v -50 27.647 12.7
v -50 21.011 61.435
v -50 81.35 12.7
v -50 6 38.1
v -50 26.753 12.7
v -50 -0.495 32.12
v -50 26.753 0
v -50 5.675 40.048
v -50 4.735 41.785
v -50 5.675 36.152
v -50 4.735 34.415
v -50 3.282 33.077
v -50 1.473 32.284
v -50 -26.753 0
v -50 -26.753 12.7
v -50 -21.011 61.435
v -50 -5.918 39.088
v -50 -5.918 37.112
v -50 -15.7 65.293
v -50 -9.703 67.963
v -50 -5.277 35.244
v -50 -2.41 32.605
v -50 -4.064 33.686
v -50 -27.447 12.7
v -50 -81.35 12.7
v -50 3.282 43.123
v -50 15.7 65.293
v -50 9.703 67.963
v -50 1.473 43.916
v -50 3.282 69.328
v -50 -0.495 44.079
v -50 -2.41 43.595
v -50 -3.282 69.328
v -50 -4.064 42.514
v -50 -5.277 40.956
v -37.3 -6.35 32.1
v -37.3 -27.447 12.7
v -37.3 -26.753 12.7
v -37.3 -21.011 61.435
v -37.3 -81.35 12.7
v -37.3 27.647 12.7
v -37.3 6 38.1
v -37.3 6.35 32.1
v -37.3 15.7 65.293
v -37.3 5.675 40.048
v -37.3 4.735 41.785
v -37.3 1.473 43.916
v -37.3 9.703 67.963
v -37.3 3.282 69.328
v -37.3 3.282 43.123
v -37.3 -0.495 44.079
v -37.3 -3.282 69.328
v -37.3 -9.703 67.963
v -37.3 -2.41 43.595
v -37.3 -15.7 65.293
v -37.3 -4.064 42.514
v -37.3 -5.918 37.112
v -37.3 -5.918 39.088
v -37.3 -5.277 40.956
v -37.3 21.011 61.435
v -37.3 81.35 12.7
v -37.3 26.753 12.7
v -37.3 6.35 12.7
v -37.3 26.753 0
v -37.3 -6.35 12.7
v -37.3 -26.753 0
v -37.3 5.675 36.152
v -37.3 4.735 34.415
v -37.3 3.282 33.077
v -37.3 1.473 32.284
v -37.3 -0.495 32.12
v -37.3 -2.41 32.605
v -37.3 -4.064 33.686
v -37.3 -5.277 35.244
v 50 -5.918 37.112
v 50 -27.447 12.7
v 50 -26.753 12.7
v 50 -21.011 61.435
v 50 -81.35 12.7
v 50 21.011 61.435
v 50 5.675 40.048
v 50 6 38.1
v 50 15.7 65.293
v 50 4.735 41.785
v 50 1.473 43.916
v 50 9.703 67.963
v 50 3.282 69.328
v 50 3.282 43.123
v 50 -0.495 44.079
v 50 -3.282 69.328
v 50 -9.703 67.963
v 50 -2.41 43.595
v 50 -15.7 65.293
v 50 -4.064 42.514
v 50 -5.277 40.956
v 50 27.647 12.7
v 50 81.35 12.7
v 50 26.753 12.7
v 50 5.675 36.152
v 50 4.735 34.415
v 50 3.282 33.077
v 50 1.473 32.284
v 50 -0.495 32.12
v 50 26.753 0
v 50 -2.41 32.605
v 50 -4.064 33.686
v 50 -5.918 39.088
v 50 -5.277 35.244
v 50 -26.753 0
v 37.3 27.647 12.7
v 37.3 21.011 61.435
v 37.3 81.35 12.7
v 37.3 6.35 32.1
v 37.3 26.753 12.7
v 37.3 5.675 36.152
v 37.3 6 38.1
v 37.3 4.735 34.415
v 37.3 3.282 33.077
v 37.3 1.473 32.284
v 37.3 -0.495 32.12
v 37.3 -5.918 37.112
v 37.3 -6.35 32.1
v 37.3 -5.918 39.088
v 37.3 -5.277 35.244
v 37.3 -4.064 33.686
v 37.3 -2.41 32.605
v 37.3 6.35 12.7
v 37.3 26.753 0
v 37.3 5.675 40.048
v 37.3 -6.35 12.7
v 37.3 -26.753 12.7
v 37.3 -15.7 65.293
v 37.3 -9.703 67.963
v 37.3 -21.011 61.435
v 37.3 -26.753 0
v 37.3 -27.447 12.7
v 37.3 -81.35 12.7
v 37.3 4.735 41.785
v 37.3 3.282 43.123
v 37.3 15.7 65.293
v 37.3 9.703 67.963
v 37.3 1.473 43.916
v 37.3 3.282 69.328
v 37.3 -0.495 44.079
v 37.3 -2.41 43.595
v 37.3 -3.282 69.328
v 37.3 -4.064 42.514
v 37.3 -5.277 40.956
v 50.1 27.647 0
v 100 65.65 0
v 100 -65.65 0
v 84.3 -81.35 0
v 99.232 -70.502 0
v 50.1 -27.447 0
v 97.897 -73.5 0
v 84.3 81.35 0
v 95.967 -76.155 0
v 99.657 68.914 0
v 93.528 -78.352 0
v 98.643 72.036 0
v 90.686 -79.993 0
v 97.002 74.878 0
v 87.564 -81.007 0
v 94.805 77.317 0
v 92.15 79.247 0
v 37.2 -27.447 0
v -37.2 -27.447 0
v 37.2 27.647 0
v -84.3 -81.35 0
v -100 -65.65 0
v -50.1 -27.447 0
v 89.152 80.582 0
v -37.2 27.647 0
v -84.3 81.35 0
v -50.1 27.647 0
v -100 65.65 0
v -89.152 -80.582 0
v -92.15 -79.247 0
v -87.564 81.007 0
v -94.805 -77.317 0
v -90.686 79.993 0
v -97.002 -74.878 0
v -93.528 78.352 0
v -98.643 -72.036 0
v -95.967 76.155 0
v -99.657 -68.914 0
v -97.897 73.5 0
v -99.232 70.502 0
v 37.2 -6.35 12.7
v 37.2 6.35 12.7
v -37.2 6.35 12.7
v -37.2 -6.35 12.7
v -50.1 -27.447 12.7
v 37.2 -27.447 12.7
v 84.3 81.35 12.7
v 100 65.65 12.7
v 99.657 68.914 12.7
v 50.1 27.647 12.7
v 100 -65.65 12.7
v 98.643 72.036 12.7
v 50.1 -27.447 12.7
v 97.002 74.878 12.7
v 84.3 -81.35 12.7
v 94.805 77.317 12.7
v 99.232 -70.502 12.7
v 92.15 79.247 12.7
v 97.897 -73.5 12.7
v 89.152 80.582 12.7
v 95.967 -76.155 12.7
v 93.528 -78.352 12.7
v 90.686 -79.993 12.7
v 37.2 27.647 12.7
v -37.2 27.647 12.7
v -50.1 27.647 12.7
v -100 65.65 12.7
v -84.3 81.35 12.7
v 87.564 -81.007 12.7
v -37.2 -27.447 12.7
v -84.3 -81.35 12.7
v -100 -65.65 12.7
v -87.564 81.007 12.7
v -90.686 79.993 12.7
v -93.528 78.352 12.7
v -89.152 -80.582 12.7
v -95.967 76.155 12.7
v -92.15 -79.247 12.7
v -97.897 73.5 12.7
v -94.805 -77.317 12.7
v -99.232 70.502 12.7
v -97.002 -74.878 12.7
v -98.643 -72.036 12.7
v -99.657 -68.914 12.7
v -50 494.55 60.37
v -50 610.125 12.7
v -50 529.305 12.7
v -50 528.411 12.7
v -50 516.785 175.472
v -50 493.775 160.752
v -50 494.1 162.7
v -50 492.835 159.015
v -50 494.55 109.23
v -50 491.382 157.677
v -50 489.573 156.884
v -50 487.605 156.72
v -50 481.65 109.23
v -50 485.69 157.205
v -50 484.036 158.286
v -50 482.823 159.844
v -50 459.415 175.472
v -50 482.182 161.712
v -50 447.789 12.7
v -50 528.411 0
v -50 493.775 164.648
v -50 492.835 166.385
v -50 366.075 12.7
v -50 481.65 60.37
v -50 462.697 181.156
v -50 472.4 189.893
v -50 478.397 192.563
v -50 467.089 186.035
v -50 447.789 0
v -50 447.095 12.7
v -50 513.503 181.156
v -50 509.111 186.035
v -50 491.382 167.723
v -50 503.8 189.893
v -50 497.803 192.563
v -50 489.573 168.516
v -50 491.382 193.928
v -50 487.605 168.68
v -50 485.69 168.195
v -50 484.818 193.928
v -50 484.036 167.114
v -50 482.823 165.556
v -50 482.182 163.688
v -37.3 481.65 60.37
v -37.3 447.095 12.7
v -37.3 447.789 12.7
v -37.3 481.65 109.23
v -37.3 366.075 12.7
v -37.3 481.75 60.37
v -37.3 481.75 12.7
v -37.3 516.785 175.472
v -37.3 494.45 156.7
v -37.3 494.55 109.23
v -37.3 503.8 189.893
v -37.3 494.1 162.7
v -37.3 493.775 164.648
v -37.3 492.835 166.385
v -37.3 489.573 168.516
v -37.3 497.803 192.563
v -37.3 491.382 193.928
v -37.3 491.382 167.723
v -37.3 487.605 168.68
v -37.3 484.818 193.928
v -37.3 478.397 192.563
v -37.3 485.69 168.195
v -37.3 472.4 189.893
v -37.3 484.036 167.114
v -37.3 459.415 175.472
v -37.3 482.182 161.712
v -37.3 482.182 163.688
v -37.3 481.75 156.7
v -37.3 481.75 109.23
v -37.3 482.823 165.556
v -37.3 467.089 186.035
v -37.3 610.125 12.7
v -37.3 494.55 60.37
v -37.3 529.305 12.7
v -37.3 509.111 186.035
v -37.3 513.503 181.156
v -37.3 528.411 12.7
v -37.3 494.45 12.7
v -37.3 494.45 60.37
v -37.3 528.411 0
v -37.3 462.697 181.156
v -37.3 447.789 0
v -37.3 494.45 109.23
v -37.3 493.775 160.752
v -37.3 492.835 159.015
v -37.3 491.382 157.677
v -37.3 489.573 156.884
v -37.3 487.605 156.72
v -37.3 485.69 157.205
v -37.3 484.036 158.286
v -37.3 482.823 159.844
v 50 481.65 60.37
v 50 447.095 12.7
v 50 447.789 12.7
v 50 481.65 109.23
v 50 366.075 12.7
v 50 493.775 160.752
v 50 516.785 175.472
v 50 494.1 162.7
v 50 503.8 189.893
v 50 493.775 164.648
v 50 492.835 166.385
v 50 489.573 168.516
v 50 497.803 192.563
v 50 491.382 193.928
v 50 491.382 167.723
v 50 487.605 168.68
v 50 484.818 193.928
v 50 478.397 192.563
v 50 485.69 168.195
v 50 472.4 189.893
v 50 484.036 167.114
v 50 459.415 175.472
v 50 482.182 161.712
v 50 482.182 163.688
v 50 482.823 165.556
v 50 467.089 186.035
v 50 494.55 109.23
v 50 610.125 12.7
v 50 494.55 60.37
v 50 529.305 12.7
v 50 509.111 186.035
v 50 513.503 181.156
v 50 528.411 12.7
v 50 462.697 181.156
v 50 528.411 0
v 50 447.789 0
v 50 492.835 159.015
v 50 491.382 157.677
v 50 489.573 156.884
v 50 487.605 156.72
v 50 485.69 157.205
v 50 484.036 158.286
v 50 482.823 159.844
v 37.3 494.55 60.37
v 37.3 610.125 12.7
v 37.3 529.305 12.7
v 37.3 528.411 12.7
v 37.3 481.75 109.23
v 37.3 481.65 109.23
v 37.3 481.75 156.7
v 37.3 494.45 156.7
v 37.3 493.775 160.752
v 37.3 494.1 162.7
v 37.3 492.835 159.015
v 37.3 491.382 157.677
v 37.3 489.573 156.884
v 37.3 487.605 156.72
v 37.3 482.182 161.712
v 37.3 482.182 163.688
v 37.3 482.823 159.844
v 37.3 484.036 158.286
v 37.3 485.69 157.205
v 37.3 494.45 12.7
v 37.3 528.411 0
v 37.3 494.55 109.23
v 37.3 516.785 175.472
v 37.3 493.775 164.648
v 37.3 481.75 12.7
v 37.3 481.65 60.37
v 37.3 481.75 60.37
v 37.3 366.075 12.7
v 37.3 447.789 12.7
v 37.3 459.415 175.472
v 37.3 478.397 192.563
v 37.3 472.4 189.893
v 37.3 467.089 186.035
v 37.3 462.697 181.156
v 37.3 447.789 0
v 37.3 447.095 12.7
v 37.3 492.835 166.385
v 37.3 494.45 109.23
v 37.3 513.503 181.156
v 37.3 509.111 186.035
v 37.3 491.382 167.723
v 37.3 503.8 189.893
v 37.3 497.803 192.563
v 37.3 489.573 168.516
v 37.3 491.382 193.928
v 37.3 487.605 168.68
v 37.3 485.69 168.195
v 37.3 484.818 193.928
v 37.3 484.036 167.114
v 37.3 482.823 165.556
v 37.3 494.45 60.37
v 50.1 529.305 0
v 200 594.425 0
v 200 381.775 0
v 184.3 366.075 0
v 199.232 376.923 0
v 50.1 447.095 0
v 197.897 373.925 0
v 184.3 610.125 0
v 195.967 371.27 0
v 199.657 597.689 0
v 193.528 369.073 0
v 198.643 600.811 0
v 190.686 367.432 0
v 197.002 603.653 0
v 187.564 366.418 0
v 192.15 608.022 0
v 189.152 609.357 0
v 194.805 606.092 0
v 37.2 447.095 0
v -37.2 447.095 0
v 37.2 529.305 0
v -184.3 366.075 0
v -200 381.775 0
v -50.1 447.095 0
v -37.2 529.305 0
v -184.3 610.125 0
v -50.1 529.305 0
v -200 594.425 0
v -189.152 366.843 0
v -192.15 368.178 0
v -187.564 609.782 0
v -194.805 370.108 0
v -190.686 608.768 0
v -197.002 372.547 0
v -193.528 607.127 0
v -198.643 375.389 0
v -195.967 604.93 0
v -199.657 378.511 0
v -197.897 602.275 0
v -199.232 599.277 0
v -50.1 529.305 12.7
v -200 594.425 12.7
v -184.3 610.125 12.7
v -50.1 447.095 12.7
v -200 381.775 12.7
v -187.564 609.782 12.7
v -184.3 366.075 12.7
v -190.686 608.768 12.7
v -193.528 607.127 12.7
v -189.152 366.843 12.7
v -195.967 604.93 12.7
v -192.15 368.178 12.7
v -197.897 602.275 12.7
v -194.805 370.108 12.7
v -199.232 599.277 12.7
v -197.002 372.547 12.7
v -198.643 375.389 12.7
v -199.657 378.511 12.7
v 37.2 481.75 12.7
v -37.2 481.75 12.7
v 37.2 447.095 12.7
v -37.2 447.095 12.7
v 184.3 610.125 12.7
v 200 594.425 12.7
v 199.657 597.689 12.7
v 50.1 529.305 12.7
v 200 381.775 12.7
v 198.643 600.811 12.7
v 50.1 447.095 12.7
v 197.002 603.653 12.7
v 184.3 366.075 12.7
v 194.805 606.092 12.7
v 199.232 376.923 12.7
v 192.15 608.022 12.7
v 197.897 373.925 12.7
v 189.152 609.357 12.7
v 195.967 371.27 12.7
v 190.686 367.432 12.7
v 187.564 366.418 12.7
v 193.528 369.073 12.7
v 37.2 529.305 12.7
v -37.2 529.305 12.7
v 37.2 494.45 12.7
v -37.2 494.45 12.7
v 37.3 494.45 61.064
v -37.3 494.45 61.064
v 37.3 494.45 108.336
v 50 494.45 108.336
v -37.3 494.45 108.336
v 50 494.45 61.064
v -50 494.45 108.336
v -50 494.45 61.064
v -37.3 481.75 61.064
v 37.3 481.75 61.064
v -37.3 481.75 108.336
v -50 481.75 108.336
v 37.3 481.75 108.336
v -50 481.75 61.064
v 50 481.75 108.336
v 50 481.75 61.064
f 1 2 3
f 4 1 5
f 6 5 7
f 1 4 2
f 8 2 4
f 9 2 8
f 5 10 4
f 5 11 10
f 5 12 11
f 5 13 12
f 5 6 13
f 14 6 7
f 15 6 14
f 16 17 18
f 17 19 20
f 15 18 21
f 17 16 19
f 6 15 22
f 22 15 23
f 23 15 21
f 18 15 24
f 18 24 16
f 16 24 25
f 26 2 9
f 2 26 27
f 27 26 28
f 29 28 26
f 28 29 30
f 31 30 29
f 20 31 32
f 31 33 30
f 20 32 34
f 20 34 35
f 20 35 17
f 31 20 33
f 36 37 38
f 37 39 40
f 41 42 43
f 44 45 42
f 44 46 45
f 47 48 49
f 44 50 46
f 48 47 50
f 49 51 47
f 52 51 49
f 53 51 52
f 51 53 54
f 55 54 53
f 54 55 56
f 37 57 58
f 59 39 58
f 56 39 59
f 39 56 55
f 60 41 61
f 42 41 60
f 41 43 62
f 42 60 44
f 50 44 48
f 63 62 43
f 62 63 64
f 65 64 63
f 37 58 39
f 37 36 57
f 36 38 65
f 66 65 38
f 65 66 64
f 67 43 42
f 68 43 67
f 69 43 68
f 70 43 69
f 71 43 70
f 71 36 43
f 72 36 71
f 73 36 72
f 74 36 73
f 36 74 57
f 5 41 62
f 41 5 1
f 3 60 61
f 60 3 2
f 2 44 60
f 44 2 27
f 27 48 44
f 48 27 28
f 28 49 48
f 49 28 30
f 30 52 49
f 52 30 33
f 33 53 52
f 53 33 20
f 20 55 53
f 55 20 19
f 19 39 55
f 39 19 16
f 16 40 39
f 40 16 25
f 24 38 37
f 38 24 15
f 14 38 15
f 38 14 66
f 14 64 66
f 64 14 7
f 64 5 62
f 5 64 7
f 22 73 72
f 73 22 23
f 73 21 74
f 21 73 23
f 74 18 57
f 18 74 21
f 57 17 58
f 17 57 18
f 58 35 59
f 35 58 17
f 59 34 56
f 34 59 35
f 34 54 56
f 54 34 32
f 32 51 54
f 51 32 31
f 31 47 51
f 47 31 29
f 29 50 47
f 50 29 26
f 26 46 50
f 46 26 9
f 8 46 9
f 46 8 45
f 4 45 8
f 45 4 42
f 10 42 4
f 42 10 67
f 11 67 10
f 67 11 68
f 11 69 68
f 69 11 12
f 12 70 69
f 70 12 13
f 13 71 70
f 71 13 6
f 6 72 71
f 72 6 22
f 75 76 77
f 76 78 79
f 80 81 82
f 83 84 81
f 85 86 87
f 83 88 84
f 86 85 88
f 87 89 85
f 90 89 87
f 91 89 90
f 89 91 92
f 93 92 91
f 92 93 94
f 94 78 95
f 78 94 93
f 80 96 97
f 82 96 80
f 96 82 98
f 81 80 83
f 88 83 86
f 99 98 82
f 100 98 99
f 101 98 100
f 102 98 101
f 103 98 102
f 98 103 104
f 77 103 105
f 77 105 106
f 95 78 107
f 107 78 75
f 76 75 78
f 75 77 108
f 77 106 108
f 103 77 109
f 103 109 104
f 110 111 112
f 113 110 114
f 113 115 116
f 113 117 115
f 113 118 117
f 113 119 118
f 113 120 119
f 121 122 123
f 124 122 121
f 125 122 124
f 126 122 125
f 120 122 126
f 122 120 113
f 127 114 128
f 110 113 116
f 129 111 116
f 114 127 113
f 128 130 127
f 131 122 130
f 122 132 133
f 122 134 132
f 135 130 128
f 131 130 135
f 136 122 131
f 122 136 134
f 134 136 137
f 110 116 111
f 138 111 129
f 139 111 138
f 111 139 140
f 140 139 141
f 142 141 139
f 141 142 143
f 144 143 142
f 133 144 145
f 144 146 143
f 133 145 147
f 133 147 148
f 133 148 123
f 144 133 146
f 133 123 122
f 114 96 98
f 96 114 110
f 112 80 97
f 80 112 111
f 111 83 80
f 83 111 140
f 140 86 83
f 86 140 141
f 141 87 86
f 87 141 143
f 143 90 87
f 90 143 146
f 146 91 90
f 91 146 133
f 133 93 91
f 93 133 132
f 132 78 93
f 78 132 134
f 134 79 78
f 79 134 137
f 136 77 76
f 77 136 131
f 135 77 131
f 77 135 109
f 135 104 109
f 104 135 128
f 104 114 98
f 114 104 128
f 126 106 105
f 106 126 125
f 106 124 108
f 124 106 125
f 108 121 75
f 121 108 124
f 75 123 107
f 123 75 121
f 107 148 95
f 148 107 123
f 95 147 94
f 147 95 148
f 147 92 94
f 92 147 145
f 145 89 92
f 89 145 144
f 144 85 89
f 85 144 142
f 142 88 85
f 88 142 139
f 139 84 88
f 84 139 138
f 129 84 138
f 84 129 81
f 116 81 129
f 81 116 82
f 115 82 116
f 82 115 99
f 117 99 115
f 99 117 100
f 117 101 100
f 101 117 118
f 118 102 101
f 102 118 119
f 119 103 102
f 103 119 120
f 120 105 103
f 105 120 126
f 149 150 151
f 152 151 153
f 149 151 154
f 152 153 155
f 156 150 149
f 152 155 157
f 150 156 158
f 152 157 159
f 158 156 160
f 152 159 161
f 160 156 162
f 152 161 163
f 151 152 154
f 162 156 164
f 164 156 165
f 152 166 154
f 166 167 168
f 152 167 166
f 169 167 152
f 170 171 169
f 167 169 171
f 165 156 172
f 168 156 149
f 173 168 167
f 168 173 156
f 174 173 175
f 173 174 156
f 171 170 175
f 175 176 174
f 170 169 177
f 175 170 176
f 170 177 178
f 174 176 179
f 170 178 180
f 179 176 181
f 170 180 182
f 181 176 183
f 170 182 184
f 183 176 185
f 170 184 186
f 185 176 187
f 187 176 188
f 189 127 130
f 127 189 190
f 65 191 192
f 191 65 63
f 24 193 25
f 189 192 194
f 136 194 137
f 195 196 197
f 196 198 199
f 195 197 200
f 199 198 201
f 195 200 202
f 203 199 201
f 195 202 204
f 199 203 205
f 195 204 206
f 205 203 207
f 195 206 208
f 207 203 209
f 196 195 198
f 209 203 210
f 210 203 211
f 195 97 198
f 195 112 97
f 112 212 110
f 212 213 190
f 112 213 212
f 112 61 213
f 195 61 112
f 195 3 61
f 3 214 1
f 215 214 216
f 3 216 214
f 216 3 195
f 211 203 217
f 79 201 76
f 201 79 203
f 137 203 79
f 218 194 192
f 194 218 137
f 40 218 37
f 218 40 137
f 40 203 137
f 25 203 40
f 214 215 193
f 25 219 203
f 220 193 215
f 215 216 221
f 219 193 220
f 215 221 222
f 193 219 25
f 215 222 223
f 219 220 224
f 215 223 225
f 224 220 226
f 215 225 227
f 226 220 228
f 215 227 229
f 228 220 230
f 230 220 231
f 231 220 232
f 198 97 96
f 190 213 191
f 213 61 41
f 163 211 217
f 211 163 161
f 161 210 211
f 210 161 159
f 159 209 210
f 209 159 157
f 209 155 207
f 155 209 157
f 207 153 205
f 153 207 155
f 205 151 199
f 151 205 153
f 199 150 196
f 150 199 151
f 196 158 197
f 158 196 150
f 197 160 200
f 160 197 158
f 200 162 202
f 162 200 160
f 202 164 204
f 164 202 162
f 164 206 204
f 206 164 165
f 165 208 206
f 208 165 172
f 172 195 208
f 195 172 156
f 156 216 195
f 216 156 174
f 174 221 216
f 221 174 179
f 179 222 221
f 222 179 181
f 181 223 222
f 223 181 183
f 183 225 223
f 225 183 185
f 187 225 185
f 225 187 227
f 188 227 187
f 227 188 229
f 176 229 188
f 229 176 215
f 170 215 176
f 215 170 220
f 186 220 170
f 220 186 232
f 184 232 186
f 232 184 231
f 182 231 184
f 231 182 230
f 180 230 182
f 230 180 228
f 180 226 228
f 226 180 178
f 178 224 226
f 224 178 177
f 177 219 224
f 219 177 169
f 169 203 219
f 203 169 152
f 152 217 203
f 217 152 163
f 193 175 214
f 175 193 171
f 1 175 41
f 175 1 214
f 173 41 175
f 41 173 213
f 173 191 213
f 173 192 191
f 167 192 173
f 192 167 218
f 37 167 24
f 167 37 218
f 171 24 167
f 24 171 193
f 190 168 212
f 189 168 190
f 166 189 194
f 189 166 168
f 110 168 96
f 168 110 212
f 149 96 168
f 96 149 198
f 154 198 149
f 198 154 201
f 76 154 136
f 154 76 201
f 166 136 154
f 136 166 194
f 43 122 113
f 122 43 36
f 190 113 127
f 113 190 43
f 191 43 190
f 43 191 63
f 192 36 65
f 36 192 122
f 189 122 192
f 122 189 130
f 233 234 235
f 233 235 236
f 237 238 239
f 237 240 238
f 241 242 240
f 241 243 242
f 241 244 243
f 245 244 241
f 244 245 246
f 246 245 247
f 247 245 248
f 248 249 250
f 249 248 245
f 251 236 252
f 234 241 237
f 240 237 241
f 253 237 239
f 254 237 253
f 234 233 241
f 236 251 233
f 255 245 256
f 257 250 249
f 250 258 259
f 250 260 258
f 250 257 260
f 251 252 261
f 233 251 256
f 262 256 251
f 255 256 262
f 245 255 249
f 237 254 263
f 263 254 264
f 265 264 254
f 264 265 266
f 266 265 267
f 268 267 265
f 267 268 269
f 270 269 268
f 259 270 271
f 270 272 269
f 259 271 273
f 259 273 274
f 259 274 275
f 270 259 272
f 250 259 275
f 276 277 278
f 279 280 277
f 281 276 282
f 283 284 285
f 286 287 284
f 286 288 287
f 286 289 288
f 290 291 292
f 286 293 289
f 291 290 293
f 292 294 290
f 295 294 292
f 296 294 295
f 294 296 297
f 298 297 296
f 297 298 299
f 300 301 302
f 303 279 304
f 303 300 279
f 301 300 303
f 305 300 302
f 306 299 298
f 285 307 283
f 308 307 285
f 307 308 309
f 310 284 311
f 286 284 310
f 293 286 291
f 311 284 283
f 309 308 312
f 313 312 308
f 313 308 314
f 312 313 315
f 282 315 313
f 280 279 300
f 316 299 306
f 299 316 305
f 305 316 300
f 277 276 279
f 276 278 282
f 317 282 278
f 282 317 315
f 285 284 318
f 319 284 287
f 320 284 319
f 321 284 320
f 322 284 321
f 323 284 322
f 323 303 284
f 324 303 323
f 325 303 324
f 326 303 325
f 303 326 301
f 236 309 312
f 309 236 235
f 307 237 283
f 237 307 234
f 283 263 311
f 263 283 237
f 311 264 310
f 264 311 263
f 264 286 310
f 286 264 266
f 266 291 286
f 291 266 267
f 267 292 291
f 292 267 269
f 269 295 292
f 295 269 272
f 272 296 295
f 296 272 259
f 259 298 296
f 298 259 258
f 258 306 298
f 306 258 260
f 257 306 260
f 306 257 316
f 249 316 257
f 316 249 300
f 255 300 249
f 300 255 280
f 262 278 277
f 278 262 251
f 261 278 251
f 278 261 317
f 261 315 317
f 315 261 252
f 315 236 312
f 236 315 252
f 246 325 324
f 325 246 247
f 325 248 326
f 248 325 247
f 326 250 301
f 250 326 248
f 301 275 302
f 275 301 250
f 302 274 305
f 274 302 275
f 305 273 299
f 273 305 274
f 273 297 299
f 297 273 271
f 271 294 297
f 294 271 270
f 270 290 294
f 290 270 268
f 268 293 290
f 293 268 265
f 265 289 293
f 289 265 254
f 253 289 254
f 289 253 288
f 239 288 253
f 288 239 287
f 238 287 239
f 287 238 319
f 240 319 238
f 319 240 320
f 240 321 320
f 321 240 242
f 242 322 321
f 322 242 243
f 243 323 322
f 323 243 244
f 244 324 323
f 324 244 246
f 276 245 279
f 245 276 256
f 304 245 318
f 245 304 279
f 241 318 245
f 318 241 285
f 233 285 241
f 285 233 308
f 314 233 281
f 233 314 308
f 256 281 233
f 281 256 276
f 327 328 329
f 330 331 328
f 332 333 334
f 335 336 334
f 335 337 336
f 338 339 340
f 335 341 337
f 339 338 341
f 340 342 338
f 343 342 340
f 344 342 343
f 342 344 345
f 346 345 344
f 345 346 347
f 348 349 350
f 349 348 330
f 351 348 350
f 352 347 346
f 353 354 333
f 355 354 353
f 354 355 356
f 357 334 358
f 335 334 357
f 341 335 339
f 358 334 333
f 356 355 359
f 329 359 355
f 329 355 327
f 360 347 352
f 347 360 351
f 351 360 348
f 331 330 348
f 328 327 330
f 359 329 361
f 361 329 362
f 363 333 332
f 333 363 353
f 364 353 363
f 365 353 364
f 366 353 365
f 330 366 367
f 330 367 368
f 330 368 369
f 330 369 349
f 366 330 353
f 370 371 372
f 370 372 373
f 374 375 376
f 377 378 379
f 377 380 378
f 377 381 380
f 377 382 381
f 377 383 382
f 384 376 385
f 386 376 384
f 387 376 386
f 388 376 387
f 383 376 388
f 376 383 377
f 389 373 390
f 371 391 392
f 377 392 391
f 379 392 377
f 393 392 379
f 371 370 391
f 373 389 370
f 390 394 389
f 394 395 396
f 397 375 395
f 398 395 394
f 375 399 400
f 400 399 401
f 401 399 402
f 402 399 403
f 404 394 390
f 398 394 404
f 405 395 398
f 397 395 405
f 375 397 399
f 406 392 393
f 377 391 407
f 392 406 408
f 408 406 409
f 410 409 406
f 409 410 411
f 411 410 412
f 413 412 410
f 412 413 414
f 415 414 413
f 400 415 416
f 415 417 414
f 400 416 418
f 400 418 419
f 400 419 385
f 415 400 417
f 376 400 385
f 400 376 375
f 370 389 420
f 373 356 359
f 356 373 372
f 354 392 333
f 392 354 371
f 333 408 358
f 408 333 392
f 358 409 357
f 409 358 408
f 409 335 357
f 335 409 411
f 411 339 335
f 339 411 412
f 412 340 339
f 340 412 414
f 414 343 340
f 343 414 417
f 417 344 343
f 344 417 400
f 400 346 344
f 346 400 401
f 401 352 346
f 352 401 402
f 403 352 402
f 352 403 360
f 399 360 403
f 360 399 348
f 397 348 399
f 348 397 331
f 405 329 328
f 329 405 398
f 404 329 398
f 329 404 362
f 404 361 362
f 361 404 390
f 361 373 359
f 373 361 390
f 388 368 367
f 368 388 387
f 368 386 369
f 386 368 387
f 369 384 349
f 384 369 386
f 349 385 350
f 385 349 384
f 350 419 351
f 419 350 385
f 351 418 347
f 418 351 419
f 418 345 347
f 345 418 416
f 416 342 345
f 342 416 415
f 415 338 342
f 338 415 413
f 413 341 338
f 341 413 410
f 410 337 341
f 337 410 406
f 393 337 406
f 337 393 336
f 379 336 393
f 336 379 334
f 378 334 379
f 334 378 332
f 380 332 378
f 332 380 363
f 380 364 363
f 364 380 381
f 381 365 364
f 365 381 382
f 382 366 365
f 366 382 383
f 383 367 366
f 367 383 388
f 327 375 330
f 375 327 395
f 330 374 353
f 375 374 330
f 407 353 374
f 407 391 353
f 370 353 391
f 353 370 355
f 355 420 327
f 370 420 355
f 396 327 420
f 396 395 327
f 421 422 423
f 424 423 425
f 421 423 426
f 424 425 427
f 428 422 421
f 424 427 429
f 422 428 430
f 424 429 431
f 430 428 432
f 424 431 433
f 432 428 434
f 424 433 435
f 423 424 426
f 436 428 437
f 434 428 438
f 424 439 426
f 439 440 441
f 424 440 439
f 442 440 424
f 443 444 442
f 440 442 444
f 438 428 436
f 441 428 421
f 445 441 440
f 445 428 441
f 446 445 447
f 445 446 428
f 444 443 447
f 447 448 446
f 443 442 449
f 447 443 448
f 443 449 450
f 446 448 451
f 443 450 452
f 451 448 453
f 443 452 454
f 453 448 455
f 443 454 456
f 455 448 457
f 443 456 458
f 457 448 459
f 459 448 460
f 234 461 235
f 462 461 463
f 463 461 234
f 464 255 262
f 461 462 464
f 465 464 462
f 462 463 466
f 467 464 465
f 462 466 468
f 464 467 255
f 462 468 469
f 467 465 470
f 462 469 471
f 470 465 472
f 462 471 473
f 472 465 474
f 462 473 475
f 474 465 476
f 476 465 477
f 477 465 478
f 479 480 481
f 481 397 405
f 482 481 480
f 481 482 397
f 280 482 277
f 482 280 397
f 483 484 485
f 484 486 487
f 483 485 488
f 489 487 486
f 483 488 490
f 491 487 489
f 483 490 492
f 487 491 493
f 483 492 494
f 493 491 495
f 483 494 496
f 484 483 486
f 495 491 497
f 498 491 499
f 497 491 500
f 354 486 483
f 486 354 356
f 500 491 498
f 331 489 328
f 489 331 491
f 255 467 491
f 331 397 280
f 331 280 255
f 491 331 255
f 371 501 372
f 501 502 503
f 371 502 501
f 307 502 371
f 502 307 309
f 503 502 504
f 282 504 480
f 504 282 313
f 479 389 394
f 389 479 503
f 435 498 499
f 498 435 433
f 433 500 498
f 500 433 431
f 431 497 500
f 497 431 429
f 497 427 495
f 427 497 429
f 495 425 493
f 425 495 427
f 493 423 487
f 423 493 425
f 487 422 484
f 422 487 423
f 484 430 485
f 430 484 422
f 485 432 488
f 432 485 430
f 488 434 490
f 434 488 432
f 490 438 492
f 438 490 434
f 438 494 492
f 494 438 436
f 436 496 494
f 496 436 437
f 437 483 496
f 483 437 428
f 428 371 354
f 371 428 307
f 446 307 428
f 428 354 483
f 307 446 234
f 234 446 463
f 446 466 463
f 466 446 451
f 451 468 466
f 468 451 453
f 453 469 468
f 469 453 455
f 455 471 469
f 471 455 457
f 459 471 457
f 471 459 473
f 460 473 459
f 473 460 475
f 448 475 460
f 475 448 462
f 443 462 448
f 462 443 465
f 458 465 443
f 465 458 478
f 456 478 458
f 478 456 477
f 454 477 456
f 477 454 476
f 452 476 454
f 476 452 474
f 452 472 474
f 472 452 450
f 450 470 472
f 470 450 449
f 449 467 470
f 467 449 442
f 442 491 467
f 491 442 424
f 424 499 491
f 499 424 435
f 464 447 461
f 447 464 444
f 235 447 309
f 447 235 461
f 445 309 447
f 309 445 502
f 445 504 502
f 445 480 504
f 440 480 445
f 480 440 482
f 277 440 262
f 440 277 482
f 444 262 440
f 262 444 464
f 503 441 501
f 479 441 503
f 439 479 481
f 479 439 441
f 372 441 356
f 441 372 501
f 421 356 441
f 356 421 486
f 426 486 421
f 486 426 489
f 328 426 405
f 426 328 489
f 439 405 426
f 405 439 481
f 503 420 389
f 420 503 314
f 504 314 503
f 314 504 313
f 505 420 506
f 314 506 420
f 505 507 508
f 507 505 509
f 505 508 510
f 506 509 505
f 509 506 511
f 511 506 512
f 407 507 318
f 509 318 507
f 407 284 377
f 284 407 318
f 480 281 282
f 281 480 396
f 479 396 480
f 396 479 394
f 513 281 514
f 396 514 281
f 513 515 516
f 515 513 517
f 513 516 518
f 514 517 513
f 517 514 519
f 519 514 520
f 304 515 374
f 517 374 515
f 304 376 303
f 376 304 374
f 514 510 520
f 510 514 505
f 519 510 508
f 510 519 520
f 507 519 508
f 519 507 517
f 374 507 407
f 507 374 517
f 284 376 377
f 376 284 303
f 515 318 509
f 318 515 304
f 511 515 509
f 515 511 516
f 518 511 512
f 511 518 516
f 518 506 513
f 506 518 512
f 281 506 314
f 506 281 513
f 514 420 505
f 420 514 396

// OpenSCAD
// file: joints.scad
module pintail_gaps(edge,depth,pins,gap=0) {
    segments=pins*2+1;
    segment=edge/segments;

    for(y=[segment:segment:edge-1])
    translate([0,y-gap/2])
    square([depth,gap]);
}

module negative_pins(edge,depth,pins,gap=0,hole=0) {
    segments=pins*2+1;
    segment=edge/segments;

    for(y=[0:segment*2:edge])
    translate([0,y])
    square([depth,segment]);

    pintail_gaps(edge,depth,pins,gap);

    if(hole)
    pin_holes(edge,depth,pins,hole);

}

module pintail_test(edge=200,depth=12,pins=4,gap=3,hole=6) {
    color("lime")
    negative_pins(edge,depth,pins,gap,hole);
    color("blue")
    negative_tails(edge,depth,pins,gap,hole);
}

module tail_holes(edge,depth,pins,hole) {
    segments=pins*2+1;
    segment=edge/segments;

    for(y=[segment/2:segment*2:edge])
    translate([depth/2,y])
    circle(d=hole);
}


module pin_holes(edge,depth,pins,hole) {
    segments=pins*2+1;
    segment=edge/segments;

    for(y=[segment*1.5:segment*2:edge])
    translate([depth/2,y])
    circle(d=hole);
}

module negative_tails(edge,depth,pins,gap=0,hole=0) {
    segments=pins*2+1;
    segment=edge/segments;

    for(y=[segment:segment*2:edge-1])
    translate([0,y])
    square([depth,segment]);
    pintail_gaps(edge,depth,pins,gap);

    if(hole)
    tail_holes(edge,depth,pins,hole);
}

pintail_test();
// main file
in=25.4;
wood=in/2;
pad=0.1;
zero=0.0001;

use <joints.scad>;

width=100;

axle=12;
axle_wall=in;
axle_d=axle+axle_wall*2;

front_height=150+wood;
back_height=wood+axle_wall;

base_width=400;
back_width=200;

front_depth=front_height*1.5;
back_depth=front_height;

corner=axle_d/4;


bit=in/4;

pins=1;
pintail_gap=bit/8;
pintail_hole=bit*1.1;
pintail_ear=bit;


module wood(height=wood) {
	linear_extrude(height=height)
	children();
}

module base(depth,bwidth) {
	difference() {
		offset(corner)
		offset(-corner)
		square([bwidth,depth]);
		translate([bwidth/2-width/2,0])
		dirror_x(width)
		dirror_x(wood)
		negative_tails(depth+pad*2,wood+pad,pins,pintail_gap,0,pintail_ear);
	}
}


module side(height, depth, center=false) {
	difference() {
		hull() {
			translate([0,height])
			circle(d=axle_d);
			translate([-depth/2,0])
			square([depth,wood]);
		}
		translate([0,height])
		circle(d=axle);
		translate([depth/2+pad,-pad])
		rotate([0,0,90])
		negative_pins(depth+pad*2,wood+pad,pins,pintail_gap,0,pintail_ear);
		if(center)
		translate([-wood/2,wood])
		dirror_x(wood)
		negative_tails(center_h+pad*2,wood+pad,pins,pintail_gap,0,pintail_ear);
	}
}

center_h=front_height-axle/2-wood;

module center(height) {
	difference() {
		square([width,center_h]);
		dirror_x(width)
		translate([-pad,-pad])
		negative_pins(center_h+pad*2,wood+pad,pins,pintail_gap,0,pintail_ear);
	}
}

module back_center() {
	square([width-wood*2,back_height-wood-axle/2]);
}

module dirror_x(x=0) {
	children();
	translate([x,0])
	mirror([1,0])
	children();

}


// RENDER svg
module front_side() {
	side(front_height,front_depth,true);
}

// RENDER svg
module front_base() {
	base(front_depth,base_width);
}

// RENDER svg
module front_center() {
	center(front_height);
}

module front() {
	dirror_x()
	translate([-width/2,0])
	rotate([90,0,90])
	wood()
	front_side();

	translate([-base_width/2,-front_depth/2,0])
	color("lime")
	wood()
	front_base();

	rotate([90,0])
	translate([-width/2,wood,-wood/2])
	color("magenta")
	wood()
	front_center();
}

// RENDER svg
module back_side() {
	side(back_height, back_depth);
}

// RENDER svg
module back_base() {
	base(back_depth,back_width);
}

module back() {
	dirror_x()
	translate([-width/2,0])
	rotate([90,0,90])
	wood()
	back_side();

	translate([-back_width/2,-back_depth/2,0])
	color("lime")
	wood()
	back_base();

	rotate([90,0])
	translate([-width/2+wood,wood,-wood/2])
	color("magenta")
	wood()
	back_center();
}

back();

translate([0,front_depth*2,0])
front();
